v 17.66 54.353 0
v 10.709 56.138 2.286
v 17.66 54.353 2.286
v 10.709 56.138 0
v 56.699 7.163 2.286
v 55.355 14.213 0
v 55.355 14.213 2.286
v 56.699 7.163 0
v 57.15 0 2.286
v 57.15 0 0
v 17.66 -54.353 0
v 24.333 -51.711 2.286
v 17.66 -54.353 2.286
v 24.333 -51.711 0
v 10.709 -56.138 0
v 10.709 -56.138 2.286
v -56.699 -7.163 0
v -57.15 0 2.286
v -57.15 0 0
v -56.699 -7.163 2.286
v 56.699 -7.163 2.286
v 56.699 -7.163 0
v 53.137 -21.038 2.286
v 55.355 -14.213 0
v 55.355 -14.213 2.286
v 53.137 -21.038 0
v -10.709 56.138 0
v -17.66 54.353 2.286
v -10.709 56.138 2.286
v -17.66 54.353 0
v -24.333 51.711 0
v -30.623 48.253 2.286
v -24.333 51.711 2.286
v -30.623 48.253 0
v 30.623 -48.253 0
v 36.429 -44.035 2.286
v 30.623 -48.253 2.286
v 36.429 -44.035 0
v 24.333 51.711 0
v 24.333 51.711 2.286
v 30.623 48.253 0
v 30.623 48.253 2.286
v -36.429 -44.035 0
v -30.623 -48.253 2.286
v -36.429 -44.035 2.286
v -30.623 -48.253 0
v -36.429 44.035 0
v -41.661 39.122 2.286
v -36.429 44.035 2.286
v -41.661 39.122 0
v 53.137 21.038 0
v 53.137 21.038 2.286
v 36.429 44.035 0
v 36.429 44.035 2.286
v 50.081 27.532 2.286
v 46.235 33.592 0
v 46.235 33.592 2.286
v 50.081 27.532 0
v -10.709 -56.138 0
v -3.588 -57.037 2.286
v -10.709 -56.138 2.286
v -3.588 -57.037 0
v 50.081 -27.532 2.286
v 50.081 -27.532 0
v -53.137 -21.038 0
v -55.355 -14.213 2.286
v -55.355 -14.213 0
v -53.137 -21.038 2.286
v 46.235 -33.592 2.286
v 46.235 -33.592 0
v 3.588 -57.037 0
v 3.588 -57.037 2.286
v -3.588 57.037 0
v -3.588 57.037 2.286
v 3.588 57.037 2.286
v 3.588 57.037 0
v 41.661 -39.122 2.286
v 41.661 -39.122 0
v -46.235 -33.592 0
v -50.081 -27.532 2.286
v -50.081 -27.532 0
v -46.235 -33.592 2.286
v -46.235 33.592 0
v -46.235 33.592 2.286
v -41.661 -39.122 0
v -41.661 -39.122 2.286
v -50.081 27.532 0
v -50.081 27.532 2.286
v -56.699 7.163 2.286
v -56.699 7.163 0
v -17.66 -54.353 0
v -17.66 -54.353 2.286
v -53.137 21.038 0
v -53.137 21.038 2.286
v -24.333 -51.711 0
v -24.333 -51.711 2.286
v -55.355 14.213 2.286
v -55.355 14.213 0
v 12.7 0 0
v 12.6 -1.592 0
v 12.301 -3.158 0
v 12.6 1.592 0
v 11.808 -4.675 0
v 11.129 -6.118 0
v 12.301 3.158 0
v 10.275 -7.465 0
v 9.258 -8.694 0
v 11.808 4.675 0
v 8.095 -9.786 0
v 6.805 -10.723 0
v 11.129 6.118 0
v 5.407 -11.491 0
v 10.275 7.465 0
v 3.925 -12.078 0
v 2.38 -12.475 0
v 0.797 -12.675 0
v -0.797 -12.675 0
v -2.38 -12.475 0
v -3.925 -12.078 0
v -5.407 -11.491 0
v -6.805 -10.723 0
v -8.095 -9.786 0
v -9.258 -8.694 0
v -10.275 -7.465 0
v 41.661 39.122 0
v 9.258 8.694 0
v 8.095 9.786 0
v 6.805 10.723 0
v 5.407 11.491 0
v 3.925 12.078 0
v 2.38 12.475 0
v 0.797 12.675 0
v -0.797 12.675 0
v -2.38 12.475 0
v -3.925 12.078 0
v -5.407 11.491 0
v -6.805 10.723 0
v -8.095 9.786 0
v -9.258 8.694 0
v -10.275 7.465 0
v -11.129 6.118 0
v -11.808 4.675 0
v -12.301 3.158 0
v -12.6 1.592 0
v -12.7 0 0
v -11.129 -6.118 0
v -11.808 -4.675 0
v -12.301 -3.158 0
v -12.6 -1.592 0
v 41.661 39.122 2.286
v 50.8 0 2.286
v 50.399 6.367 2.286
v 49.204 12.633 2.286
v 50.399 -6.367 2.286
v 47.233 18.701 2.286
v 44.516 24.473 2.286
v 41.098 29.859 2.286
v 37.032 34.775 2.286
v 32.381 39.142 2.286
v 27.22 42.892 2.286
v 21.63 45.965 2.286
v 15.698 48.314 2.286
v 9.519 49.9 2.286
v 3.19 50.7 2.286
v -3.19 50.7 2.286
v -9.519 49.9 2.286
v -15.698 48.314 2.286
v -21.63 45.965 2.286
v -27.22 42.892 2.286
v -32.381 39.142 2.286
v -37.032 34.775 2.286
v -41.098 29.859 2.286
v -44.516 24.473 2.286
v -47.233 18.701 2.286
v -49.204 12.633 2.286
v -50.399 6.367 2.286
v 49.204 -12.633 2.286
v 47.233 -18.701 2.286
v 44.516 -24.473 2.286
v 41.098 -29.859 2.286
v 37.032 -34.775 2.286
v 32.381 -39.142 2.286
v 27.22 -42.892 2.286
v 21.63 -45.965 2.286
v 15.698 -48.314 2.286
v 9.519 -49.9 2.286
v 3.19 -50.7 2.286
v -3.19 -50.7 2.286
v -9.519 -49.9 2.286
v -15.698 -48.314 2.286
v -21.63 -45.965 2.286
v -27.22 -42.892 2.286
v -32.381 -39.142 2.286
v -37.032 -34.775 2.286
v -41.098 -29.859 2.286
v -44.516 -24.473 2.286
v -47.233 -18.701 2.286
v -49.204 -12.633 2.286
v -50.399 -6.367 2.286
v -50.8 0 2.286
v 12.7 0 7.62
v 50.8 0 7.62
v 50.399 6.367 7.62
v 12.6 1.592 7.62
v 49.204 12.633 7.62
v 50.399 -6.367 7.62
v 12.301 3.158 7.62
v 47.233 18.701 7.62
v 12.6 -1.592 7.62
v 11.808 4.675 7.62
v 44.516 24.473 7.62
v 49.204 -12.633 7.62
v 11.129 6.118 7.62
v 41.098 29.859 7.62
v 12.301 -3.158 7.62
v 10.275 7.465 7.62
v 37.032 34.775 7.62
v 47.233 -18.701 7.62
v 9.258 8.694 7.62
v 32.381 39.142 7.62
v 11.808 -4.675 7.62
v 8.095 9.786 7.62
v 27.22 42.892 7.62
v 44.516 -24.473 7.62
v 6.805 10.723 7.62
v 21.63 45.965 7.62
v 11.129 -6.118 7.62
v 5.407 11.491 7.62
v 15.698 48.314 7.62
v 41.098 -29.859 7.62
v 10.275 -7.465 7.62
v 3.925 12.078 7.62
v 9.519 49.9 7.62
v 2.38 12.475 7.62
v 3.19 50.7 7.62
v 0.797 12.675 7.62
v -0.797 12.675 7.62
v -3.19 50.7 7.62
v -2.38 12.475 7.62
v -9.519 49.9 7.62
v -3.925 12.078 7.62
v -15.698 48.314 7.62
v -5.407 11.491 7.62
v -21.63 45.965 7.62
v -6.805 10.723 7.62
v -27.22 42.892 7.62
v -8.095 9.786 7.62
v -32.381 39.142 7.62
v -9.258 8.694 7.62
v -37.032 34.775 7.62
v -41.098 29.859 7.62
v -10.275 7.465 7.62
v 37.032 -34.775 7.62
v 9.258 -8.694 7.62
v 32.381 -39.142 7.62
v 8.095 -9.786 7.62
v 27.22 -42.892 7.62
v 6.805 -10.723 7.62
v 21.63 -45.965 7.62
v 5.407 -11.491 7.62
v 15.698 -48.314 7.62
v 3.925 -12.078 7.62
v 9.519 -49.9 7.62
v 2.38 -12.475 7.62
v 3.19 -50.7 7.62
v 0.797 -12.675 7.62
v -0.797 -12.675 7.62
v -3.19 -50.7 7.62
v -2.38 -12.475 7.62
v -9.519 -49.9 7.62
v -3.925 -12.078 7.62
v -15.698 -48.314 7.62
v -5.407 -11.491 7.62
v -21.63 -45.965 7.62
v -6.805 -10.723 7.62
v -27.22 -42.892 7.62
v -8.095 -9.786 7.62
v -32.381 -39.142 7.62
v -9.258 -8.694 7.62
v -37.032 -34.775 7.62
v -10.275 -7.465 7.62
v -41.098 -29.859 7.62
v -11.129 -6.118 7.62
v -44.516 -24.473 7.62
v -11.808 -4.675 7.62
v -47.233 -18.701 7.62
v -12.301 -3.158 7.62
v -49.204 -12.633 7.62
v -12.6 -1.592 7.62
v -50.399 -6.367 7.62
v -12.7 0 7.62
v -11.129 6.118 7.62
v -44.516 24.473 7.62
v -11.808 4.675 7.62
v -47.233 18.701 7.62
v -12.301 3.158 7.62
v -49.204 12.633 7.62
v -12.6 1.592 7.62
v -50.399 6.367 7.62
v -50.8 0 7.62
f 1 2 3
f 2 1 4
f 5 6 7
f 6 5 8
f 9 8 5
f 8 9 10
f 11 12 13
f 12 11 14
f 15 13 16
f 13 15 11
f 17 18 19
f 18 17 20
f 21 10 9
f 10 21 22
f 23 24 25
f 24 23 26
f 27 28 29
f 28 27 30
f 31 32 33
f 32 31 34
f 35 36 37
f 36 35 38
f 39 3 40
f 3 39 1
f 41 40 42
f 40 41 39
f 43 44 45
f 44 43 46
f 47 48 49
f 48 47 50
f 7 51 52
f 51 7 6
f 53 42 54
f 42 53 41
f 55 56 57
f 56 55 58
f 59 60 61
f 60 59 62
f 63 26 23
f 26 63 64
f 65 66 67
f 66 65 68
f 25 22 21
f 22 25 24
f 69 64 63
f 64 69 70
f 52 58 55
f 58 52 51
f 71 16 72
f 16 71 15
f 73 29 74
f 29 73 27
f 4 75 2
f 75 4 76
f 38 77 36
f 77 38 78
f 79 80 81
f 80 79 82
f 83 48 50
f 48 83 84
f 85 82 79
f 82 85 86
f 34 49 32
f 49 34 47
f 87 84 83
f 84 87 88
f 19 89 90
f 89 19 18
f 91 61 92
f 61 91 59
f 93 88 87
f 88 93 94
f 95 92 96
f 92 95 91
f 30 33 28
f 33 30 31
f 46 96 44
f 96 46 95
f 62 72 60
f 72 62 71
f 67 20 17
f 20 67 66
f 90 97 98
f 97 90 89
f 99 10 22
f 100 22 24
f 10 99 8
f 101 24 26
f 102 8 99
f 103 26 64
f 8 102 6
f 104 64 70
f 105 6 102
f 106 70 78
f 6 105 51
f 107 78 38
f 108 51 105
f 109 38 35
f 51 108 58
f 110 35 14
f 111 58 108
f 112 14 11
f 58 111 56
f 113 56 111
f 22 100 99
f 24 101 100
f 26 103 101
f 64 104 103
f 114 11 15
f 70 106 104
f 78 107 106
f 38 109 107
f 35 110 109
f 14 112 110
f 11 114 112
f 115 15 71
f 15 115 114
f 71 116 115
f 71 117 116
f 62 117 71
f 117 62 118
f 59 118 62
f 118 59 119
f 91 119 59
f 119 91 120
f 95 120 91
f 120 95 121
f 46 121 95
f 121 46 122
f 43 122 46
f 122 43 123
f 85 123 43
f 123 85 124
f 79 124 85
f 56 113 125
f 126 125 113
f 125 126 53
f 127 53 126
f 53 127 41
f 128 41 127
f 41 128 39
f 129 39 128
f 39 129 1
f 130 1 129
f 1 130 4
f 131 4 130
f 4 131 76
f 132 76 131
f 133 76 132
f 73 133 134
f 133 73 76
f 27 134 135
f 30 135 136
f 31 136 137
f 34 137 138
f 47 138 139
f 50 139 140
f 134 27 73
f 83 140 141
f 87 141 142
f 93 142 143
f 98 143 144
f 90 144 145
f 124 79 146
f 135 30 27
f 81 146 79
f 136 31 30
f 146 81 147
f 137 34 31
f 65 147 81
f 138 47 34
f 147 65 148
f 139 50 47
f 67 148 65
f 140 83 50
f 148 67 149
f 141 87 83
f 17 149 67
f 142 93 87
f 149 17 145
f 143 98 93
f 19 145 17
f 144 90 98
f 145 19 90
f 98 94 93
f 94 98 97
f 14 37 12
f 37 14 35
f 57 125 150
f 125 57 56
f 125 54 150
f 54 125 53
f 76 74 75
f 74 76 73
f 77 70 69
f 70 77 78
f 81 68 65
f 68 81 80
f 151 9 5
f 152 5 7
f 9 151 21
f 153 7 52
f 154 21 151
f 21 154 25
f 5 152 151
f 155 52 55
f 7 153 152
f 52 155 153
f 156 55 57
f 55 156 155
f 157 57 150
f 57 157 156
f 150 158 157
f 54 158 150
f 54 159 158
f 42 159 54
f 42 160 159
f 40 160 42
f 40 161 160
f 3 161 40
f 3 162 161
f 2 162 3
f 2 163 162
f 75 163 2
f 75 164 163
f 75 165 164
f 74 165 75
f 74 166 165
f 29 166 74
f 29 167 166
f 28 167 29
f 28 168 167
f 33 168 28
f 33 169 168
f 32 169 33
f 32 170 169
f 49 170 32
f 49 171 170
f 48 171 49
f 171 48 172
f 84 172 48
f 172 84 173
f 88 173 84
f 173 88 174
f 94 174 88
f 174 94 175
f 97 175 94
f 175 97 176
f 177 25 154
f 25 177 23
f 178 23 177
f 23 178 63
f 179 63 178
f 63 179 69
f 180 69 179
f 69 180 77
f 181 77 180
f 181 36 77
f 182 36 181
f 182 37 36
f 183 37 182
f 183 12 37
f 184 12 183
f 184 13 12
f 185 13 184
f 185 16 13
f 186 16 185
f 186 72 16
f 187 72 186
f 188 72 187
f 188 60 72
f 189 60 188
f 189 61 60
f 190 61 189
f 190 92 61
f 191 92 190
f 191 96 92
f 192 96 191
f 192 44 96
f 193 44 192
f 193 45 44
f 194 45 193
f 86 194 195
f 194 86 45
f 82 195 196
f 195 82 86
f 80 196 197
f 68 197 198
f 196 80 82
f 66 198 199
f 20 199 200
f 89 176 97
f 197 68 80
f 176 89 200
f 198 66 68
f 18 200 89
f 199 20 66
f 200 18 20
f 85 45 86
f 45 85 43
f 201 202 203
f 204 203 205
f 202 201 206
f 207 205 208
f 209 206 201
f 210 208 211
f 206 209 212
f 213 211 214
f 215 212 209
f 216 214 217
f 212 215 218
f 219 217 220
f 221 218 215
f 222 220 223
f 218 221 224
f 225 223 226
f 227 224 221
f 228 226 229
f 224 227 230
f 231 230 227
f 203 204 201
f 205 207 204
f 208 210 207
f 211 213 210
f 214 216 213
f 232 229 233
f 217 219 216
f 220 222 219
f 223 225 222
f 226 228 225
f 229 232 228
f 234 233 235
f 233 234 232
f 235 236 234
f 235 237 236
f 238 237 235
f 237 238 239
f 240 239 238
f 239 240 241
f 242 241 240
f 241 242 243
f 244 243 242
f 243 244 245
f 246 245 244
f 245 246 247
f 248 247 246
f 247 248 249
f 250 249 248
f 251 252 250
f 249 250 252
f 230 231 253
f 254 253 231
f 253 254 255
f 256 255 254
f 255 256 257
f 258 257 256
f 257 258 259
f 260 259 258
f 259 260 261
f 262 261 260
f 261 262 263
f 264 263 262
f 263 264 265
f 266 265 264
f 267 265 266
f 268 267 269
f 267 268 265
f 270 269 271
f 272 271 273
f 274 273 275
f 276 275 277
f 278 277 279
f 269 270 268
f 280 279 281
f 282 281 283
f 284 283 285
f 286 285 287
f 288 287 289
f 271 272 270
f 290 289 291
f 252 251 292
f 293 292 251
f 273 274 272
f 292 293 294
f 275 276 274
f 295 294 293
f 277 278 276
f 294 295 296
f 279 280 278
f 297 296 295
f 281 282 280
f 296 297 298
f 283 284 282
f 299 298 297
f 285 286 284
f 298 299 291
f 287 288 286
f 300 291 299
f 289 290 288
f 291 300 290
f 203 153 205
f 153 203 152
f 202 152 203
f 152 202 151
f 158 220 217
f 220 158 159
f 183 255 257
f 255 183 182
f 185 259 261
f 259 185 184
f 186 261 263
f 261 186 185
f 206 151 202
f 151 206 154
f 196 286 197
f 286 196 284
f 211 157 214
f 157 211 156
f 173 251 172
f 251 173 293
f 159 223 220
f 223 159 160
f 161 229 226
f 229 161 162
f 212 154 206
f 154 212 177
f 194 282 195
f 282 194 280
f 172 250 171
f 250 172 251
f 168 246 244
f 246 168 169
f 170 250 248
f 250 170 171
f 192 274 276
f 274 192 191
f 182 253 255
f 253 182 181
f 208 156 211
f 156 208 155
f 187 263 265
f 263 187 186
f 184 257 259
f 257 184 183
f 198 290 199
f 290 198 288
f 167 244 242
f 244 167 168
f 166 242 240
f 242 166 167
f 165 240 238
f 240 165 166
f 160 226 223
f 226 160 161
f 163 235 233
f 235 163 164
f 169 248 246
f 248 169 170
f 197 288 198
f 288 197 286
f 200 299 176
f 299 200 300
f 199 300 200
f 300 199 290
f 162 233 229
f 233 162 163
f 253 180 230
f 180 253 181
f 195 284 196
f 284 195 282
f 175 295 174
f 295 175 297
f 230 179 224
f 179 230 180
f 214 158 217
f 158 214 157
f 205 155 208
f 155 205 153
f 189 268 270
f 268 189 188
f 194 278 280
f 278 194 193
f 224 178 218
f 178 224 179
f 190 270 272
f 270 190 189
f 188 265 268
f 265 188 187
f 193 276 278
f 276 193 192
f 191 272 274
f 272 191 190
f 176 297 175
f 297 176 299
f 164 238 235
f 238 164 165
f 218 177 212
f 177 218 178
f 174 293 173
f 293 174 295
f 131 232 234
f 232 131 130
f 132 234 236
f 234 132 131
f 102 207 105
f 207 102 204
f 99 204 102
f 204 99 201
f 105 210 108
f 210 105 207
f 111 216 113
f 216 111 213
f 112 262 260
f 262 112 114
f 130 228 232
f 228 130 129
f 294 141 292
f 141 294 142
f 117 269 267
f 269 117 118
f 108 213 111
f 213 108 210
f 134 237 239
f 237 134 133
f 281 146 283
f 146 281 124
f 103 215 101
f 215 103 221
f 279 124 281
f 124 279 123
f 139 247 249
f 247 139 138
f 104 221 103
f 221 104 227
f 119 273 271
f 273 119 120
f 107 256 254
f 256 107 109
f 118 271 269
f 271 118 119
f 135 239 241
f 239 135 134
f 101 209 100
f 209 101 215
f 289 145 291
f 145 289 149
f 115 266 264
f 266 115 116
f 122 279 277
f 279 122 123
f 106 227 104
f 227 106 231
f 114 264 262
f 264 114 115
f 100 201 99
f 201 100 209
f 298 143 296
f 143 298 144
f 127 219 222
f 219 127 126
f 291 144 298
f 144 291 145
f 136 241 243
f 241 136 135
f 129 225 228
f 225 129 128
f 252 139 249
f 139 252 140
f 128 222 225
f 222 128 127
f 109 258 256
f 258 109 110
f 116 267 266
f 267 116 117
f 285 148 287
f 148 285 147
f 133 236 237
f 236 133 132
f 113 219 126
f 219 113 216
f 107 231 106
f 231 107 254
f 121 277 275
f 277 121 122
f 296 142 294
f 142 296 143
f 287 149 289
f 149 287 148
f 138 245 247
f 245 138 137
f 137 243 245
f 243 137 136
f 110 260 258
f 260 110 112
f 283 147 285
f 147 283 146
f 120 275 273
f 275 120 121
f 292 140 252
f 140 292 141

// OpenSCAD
// Router Plate Insert
// Gary Liming Summer 2017
InchBitDiameter = .500;        // zero = no hole
InchLipDepth = .090;           // 
InchOuterDiameter = 2.25;      // overall diameter
InchRimDiameter = 2.00;
InchOverallThickness = .300;   // how deep of an insert

BitDiameter = 25.4 * InchBitDiameter;  // convert imperial to metric
LipDepth = 25.4 * InchLipDepth;
OuterDiameter = 25.4 * InchOuterDiameter;
RimDiameter = 25.4 * InchRimDiameter;
OverallThickness = 25.4 * InchOverallThickness;

if (BitDiameter == 0) {
  union() {
    cylinder(h=LipDepth, r=OuterDiameter, $fn=50);
    cylinder(h=OverallThickness, r=RimDiameter, $fn=50);
  }
} else {
 difference() {   
   union() {
     cylinder(h=LipDepth, r=OuterDiameter, $fn=50);
     cylinder(h=OverallThickness, r=RimDiameter, $fn=50);
   }
  cylinder (h=OverallThickness, r= BitDiameter, $fn=50);    
  }
 }
